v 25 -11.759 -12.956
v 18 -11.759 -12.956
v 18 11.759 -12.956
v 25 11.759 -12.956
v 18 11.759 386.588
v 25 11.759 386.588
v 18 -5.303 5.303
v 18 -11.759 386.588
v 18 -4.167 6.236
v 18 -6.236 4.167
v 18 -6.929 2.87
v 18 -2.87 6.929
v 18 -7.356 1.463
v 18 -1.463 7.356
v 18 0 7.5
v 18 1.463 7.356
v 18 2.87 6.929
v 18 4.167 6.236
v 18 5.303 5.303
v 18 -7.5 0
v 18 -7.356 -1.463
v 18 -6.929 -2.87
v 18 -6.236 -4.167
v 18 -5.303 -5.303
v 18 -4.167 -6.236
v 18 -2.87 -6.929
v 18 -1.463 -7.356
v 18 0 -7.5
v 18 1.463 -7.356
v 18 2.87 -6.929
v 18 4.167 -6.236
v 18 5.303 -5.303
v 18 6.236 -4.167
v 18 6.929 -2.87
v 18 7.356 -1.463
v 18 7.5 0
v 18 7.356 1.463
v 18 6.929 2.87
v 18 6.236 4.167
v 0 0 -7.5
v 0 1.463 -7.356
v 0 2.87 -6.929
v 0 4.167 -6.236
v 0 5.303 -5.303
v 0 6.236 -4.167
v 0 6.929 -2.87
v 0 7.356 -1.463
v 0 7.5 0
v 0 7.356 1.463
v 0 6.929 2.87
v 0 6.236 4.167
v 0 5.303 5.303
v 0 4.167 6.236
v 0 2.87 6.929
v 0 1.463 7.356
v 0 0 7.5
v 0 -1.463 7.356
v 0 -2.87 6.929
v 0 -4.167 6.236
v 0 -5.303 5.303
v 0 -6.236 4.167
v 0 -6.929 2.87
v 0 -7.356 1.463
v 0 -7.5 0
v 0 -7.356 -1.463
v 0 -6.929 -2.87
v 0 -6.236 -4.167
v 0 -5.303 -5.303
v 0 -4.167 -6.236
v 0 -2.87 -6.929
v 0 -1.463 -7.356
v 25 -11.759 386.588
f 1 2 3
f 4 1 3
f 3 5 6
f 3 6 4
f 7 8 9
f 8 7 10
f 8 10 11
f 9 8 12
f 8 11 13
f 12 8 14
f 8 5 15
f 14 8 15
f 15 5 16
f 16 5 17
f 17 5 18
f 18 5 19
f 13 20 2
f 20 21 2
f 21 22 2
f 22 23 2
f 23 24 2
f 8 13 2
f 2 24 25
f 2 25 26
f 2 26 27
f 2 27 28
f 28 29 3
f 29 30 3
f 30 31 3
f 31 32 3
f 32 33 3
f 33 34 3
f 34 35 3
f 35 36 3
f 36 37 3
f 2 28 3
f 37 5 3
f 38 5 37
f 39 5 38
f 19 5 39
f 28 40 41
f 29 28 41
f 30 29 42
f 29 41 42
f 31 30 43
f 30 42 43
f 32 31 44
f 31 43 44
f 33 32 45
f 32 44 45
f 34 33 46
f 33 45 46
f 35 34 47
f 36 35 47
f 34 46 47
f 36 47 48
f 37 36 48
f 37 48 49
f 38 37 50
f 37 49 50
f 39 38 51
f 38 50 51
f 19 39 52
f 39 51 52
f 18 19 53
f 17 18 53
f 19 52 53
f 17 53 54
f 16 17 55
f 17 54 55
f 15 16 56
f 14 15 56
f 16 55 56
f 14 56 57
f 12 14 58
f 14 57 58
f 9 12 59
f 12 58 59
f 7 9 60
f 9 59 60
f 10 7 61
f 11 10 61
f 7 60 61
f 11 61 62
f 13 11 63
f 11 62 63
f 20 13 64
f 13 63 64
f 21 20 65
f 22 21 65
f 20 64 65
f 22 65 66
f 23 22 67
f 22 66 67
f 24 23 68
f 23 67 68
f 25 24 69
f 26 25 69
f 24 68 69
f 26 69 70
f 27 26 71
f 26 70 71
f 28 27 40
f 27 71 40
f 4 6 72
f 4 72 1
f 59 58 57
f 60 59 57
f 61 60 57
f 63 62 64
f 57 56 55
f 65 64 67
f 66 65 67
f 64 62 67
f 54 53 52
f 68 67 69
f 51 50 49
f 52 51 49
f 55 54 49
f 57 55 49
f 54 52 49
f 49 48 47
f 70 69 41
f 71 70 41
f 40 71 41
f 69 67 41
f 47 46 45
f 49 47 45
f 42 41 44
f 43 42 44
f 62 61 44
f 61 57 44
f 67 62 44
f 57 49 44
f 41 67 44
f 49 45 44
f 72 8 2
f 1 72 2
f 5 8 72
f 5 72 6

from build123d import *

# Parameters (mm, degrees)
SKETCH1_R           = 7.5
BOSS_EXTRUDE1_DEPTH = 18
SKETCH2_W           = 399.543241252
SKETCH2_H           = 23.51775922
BOSS_EXTRUDE2_DEPTH = 7


with BuildPart() as part:
    # Sketch1 → Boss-Extrude1 (new body)
    with BuildSketch(Plane(origin=(0, 0, 0), x_dir=(0, 0, -1), z_dir=(1, 0, 0))):
        Circle(SKETCH1_R)
    extrude(amount=BOSS_EXTRUDE1_DEPTH)

    # Sketch2 → Boss-Extrude2 (add)
    with BuildSketch(Plane(origin=(18, 0, 0), x_dir=(0, 0, -1), z_dir=(1, 0, 0))):
        with Locations((-186.816113962, 0)):
            Rectangle(SKETCH2_W, SKETCH2_H)
    extrude(amount=BOSS_EXTRUDE2_DEPTH)


solid = part.part
